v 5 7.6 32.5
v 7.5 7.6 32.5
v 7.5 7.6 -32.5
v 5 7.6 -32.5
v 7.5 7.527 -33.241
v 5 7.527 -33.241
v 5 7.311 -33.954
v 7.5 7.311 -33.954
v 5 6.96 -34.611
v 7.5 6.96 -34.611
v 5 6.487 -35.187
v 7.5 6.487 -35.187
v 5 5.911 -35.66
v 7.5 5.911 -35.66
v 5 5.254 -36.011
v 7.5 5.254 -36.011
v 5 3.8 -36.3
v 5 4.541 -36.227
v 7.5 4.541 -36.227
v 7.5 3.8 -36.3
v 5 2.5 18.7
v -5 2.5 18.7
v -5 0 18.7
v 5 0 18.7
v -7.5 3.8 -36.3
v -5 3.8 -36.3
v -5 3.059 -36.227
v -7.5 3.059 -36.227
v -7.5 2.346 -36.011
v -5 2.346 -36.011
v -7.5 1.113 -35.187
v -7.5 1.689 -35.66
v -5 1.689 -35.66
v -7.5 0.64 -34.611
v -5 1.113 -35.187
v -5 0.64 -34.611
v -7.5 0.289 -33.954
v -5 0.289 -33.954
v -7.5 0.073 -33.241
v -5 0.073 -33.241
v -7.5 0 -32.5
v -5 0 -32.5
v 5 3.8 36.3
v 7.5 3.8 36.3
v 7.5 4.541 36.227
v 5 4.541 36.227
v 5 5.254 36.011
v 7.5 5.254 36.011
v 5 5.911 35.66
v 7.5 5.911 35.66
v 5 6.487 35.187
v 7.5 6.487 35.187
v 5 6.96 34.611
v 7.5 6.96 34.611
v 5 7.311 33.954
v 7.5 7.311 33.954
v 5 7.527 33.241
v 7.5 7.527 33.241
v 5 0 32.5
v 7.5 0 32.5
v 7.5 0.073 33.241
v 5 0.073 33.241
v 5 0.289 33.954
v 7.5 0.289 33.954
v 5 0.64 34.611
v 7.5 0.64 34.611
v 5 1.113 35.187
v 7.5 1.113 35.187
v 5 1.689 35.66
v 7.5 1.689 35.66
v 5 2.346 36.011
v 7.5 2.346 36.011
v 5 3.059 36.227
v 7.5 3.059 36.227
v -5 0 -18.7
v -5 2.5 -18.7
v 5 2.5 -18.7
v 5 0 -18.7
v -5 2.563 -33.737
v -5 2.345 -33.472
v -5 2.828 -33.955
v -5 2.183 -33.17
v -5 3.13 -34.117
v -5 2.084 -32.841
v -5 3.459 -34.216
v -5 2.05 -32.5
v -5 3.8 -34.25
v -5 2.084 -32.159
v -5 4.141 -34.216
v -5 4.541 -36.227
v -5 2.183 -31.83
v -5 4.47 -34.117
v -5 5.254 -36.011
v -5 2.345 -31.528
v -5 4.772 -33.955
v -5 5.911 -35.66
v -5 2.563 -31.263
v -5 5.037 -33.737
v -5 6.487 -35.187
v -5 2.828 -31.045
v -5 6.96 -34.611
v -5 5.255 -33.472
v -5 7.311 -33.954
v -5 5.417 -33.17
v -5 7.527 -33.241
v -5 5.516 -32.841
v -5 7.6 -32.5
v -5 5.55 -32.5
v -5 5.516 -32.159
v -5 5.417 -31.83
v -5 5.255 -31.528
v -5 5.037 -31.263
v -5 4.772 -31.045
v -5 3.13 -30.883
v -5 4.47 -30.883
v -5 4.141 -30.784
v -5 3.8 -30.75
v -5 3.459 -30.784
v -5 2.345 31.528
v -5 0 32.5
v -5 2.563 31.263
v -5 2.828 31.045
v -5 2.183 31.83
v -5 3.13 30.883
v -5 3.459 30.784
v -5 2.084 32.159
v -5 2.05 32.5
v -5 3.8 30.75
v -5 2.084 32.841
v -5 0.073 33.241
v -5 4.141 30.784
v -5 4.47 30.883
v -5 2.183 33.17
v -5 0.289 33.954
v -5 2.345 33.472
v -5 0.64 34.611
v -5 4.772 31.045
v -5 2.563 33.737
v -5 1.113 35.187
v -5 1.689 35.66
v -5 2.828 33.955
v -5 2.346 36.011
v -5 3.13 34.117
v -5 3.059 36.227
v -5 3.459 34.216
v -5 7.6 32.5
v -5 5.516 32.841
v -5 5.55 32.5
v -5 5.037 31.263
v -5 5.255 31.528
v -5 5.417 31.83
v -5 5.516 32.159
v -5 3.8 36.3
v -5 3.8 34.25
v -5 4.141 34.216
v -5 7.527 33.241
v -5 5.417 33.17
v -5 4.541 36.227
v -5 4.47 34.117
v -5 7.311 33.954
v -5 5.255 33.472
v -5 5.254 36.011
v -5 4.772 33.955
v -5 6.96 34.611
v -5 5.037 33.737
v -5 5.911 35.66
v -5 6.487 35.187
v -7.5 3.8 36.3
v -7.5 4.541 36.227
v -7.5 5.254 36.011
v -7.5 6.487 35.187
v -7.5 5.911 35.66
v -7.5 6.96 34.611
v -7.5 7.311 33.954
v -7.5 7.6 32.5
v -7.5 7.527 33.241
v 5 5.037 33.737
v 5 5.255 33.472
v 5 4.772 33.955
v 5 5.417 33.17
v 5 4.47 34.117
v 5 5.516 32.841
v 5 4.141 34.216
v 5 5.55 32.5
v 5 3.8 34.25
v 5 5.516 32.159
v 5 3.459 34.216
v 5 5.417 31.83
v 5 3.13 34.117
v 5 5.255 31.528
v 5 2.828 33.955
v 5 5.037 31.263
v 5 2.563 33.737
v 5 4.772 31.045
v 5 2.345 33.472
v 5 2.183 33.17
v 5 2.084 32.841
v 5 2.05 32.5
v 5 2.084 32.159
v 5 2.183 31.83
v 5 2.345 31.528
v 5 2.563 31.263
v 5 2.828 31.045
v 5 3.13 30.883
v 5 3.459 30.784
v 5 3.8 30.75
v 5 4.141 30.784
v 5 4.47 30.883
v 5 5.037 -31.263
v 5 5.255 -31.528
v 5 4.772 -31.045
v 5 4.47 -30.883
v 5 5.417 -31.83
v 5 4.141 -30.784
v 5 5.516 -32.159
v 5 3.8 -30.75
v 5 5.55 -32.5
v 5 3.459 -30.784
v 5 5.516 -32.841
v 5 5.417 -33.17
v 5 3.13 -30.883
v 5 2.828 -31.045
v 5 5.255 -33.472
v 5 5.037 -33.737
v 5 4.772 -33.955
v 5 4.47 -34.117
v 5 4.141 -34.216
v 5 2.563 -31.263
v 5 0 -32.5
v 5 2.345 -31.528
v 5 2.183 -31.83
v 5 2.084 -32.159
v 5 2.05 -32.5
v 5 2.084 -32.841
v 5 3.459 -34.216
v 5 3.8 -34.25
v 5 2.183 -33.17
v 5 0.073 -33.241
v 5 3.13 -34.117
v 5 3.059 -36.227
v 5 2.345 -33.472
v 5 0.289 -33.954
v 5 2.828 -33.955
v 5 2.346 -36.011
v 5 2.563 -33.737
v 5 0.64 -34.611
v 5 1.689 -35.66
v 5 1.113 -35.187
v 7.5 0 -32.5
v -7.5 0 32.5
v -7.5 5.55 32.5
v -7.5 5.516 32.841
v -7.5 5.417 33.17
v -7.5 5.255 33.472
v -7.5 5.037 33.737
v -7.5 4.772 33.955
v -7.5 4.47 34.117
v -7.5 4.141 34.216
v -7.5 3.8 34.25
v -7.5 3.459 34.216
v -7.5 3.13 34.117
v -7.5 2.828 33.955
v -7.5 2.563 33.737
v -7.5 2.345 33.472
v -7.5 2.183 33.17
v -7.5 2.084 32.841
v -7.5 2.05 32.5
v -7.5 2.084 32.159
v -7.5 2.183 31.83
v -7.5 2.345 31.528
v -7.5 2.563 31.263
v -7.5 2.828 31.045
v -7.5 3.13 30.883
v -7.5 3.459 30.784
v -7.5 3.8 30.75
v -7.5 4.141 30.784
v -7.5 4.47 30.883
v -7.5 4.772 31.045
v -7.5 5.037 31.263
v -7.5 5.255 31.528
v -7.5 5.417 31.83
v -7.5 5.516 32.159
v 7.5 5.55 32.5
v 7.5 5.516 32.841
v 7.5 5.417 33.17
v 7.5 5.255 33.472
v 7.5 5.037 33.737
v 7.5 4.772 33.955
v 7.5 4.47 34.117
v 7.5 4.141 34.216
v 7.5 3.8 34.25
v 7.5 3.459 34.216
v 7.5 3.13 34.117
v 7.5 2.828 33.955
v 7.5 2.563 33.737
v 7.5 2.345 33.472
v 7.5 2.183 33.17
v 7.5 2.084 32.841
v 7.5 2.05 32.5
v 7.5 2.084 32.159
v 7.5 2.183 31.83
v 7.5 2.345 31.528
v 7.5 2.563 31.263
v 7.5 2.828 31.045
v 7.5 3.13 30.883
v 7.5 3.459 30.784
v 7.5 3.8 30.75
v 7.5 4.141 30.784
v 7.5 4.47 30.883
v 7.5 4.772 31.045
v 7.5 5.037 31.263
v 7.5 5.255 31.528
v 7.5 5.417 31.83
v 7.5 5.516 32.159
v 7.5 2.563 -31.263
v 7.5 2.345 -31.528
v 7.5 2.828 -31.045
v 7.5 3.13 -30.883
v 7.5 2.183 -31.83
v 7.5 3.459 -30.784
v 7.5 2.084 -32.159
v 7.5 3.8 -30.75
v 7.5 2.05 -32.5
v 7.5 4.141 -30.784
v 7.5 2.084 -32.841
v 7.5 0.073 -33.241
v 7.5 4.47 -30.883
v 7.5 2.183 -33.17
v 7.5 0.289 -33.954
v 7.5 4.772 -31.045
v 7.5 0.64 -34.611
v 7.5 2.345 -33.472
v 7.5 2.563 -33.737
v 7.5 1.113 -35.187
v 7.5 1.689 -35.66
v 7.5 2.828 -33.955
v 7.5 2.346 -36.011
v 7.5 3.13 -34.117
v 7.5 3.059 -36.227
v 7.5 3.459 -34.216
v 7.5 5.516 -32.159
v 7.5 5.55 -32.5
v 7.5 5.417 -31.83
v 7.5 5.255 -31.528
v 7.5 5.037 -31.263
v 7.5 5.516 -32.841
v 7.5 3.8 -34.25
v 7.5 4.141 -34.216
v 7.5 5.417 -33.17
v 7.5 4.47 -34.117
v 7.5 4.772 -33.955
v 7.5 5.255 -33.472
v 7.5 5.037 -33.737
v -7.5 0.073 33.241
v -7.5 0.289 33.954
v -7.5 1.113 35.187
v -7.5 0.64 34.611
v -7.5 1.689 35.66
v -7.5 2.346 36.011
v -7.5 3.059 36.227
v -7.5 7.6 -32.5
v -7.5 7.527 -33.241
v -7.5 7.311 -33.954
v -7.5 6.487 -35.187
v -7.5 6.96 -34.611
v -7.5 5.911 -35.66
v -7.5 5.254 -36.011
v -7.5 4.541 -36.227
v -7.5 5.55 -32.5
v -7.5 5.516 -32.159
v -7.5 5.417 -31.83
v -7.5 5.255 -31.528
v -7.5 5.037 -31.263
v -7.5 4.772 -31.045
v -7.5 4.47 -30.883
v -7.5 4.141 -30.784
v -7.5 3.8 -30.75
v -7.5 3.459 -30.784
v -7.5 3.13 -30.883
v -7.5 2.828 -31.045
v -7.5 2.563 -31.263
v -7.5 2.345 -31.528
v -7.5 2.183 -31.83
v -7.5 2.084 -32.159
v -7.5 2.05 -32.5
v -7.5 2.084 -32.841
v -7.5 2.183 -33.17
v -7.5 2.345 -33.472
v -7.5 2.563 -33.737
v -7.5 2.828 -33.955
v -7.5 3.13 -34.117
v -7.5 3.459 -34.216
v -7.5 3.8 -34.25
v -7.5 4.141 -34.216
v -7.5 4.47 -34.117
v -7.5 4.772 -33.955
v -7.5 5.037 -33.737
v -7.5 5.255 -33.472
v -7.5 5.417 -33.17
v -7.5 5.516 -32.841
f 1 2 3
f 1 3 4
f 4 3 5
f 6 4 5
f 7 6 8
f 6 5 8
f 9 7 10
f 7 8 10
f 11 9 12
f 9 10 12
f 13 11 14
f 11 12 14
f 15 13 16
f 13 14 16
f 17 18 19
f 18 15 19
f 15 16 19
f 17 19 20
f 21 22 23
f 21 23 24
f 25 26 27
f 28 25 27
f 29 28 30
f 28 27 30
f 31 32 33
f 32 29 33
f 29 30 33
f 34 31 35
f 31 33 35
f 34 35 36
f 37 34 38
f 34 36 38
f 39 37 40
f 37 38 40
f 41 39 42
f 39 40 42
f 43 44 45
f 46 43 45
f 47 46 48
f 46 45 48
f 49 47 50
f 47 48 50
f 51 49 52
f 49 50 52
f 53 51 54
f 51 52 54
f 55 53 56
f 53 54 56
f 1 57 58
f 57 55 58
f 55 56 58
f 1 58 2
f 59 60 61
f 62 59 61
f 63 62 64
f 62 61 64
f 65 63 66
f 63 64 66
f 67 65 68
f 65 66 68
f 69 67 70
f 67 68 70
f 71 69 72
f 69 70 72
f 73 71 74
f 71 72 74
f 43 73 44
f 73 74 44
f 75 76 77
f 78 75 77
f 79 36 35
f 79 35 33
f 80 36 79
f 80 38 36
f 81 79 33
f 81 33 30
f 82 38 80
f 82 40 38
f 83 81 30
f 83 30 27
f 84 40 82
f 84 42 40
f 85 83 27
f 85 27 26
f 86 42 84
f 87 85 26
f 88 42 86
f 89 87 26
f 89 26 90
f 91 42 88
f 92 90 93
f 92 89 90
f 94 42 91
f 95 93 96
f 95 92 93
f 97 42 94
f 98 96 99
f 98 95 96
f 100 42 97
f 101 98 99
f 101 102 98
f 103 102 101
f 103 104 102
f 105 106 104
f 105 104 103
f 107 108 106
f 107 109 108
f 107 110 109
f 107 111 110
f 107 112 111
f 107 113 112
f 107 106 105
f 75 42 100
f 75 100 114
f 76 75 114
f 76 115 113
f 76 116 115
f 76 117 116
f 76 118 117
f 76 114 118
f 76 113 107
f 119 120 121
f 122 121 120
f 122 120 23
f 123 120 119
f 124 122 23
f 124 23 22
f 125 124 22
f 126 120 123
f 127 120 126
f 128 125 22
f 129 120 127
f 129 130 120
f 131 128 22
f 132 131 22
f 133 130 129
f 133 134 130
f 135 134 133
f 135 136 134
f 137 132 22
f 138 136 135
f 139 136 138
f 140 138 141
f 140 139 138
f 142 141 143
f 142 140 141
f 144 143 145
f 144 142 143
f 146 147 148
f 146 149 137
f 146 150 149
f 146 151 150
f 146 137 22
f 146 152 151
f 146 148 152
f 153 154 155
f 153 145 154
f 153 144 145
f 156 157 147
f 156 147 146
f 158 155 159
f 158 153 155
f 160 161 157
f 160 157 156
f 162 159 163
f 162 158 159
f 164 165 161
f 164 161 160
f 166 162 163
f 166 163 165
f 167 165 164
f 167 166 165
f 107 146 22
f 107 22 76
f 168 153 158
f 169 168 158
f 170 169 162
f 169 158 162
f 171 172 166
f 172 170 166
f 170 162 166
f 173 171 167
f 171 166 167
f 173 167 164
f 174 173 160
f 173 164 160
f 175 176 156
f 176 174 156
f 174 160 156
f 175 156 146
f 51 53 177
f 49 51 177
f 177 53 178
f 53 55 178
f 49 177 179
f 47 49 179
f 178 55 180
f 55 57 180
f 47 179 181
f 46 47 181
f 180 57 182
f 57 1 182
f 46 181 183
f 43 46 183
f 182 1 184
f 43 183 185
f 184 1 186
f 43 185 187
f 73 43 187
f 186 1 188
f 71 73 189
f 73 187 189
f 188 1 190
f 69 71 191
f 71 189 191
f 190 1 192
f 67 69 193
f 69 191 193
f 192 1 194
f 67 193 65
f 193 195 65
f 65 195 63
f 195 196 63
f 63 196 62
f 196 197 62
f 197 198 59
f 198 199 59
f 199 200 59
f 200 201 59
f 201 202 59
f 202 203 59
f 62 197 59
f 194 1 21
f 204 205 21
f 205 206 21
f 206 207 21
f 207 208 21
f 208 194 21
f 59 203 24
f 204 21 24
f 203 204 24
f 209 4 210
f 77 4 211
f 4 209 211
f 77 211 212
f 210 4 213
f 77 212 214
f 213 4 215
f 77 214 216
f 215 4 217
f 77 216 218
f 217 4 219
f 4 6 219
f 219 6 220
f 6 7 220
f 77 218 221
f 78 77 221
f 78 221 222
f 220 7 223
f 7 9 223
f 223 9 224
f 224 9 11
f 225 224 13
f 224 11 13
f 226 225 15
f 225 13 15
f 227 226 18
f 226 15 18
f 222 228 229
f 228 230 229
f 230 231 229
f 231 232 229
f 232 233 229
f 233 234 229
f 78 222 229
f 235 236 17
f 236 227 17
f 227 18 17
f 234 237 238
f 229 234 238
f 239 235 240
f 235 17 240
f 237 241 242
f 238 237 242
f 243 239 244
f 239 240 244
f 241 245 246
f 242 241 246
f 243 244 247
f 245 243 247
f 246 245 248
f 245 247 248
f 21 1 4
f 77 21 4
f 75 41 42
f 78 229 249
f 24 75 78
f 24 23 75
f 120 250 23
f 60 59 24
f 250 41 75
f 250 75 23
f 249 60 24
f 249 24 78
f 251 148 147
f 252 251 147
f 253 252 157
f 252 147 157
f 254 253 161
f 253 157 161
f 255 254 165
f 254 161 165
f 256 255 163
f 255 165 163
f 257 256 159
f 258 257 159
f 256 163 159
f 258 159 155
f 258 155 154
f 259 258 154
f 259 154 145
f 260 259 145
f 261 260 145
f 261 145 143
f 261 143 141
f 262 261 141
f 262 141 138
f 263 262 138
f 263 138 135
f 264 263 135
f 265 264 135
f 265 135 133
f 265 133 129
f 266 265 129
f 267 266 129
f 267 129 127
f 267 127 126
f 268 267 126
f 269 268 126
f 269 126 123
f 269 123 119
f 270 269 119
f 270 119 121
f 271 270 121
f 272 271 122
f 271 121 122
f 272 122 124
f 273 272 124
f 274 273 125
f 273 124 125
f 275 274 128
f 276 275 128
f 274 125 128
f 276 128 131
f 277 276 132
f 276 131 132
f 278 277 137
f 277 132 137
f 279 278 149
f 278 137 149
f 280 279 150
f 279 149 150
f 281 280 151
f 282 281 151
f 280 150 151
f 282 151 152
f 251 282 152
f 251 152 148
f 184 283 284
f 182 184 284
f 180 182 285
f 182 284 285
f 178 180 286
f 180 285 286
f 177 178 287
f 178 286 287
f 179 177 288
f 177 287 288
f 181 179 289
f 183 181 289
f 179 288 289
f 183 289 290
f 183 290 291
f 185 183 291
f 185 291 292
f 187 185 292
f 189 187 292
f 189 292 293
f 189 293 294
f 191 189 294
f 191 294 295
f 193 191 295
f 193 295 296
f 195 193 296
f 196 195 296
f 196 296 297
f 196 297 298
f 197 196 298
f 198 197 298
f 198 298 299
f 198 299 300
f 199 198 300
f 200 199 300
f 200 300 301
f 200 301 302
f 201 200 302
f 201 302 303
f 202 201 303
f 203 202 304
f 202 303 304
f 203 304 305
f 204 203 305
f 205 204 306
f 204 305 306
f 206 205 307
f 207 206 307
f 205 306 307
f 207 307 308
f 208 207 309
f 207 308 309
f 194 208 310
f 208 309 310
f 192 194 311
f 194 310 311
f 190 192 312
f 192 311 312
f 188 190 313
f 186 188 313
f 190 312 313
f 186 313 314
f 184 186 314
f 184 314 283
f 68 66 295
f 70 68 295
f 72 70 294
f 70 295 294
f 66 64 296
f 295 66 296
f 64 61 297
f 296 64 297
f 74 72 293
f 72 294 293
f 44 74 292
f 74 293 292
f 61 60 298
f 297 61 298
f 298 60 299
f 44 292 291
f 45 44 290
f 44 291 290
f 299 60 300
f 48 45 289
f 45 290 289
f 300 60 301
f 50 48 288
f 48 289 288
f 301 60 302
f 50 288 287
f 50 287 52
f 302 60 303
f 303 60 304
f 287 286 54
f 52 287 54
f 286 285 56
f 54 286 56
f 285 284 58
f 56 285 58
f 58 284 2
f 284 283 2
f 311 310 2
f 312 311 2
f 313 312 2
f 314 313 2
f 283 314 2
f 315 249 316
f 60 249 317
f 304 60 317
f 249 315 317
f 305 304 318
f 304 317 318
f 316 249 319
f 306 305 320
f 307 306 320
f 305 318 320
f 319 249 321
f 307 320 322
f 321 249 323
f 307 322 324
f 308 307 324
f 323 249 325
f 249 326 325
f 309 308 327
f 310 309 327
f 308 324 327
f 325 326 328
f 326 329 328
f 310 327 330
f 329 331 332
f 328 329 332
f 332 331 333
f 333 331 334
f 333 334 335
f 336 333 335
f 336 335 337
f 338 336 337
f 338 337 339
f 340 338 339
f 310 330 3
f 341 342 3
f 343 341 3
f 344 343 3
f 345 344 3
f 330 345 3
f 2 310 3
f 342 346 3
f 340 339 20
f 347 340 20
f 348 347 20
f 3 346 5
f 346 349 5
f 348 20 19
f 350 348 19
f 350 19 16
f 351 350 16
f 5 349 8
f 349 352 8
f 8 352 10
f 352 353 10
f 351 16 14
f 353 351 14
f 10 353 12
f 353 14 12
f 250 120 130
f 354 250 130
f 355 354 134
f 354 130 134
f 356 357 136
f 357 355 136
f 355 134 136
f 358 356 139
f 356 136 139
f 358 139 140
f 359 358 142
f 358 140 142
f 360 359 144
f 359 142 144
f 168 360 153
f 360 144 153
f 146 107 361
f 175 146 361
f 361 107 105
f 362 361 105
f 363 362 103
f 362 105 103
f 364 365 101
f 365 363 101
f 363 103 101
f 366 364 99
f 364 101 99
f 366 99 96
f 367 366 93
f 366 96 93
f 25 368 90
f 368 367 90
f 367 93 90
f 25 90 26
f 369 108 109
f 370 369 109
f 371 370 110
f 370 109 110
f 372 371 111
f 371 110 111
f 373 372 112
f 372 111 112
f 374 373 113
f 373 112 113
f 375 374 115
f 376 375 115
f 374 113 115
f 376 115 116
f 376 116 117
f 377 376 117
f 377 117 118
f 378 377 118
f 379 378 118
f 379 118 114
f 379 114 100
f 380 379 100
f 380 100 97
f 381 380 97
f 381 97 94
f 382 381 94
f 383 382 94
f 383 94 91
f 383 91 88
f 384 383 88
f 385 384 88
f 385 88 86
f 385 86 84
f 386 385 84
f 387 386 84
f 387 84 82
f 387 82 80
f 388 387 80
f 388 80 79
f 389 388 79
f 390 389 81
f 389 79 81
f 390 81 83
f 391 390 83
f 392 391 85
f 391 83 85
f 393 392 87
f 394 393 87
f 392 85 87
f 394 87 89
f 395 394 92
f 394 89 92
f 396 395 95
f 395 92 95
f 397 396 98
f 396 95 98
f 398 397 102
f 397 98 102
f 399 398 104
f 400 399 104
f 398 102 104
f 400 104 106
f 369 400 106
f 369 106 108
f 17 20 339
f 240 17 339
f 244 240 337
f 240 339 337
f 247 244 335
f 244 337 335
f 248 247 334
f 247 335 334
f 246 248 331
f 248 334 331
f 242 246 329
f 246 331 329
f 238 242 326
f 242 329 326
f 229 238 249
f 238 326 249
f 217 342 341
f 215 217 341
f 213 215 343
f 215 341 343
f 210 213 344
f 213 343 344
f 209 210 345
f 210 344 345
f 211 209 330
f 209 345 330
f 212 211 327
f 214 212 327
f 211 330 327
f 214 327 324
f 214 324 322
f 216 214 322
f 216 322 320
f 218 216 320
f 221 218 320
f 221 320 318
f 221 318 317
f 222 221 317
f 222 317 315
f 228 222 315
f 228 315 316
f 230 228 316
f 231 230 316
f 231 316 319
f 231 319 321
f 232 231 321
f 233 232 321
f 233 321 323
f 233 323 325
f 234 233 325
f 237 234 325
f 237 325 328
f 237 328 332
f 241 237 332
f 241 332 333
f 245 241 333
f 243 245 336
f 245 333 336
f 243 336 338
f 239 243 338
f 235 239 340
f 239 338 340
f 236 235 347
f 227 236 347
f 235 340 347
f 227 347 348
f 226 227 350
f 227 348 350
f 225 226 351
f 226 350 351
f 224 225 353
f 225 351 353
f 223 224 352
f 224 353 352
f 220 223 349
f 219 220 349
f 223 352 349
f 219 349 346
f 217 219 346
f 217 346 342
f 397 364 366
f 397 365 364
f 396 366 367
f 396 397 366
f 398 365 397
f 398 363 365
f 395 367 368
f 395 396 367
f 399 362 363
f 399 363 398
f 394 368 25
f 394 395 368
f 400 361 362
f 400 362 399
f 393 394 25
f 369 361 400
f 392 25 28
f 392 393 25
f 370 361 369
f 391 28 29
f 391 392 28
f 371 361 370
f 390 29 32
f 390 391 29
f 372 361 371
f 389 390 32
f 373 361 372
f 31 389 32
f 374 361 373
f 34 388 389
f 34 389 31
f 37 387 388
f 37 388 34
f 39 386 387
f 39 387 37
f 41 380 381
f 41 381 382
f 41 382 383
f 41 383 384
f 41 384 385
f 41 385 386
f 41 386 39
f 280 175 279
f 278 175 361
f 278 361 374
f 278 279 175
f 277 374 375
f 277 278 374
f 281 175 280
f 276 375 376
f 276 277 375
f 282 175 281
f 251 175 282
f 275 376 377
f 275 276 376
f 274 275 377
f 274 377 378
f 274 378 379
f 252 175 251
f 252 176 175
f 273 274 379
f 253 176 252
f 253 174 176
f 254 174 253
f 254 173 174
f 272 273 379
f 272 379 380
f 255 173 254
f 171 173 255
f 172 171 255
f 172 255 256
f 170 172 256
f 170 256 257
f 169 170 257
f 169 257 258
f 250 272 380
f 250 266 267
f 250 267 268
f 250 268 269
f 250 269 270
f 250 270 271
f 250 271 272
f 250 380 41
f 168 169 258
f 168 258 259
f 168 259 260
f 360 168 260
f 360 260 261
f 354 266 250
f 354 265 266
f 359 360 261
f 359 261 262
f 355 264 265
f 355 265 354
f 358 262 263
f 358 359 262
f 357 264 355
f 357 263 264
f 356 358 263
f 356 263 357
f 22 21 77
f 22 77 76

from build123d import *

# Parameters (mm, degrees)
F0_W     = 5
F0_H     = 2.5
F1_DEPTH = 18.7
F2_DEPTH = 36.3
F3_R     = 1.75
F4_DEPTH = 15.001


with BuildPart() as f1:
    # F0 (on Top) → F1 (new body, symmetric)
    with BuildSketch(Plane.XY):
        with Locations((2.5, 1.25)):
            Rectangle(F0_W, F0_H)
        with Locations((-2.5, 1.25)):
            Rectangle(F0_W, F0_H)
    extrude(amount=F1_DEPTH, both=True)

    # F0 (on Top) → F2 (join, symmetric)
    with BuildSketch(Plane.XY):
        Polygon((5, 7.6), (5, 2.5), (5, 0), (7.5, 0), (7.5, 7.6), align=None)
        Polygon((-5, 7.6), (-7.5, 7.6), (-7.5, 0), (-5, 0), (-5, 2.5), align=None)
    extrude(amount=F2_DEPTH, both=True)

    # F3 (on face) → F4 (cut, through all)
    with BuildSketch(Plane.YZ.offset(7.5)):
        with Locations((3.8, 32.5)):
            Circle(F3_R)
        Polygon((0, 36.3), (3.8, 36.3), (7.6, 36.3), (7.6, 42.815186), (0, 42.815186), align=None)
        with BuildLine():
            ThreePointArc((3.8, 36.3), (6.487006, 35.187006), (7.6, 32.5))
            Line((7.6, 32.5), (7.6, 36.3))
            Line((7.6, 36.3), (3.8, 36.3))
        make_face()
        with BuildLine():
            Line((0, 36.3), (0, 32.5))
            ThreePointArc((0, 32.5), (1.112994, 35.187006), (3.8, 36.3))
            Line((3.8, 36.3), (0, 36.3))
        make_face()
        with Locations((3.8, -32.5)):
            Circle(F3_R)
        Polygon((7.6, -36.3), (3.8, -36.3), (0, -36.3), (0, -42.815186), (7.6, -42.815186), align=None)
        with BuildLine():
            Line((7.6, -36.3), (7.6, -32.5))
            ThreePointArc((7.6, -32.5), (6.487006, -35.187006), (3.8, -36.3))
            Line((3.8, -36.3), (7.6, -36.3))
        make_face()
        with BuildLine():
            ThreePointArc((3.8, -36.3), (1.112994, -35.187006), (0, -32.5))
            Line((0, -32.5), (0, -36.3))
            Line((0, -36.3), (3.8, -36.3))
        make_face()
    extrude(amount=-F4_DEPTH, mode=Mode.SUBTRACT)


solid = f1.part
